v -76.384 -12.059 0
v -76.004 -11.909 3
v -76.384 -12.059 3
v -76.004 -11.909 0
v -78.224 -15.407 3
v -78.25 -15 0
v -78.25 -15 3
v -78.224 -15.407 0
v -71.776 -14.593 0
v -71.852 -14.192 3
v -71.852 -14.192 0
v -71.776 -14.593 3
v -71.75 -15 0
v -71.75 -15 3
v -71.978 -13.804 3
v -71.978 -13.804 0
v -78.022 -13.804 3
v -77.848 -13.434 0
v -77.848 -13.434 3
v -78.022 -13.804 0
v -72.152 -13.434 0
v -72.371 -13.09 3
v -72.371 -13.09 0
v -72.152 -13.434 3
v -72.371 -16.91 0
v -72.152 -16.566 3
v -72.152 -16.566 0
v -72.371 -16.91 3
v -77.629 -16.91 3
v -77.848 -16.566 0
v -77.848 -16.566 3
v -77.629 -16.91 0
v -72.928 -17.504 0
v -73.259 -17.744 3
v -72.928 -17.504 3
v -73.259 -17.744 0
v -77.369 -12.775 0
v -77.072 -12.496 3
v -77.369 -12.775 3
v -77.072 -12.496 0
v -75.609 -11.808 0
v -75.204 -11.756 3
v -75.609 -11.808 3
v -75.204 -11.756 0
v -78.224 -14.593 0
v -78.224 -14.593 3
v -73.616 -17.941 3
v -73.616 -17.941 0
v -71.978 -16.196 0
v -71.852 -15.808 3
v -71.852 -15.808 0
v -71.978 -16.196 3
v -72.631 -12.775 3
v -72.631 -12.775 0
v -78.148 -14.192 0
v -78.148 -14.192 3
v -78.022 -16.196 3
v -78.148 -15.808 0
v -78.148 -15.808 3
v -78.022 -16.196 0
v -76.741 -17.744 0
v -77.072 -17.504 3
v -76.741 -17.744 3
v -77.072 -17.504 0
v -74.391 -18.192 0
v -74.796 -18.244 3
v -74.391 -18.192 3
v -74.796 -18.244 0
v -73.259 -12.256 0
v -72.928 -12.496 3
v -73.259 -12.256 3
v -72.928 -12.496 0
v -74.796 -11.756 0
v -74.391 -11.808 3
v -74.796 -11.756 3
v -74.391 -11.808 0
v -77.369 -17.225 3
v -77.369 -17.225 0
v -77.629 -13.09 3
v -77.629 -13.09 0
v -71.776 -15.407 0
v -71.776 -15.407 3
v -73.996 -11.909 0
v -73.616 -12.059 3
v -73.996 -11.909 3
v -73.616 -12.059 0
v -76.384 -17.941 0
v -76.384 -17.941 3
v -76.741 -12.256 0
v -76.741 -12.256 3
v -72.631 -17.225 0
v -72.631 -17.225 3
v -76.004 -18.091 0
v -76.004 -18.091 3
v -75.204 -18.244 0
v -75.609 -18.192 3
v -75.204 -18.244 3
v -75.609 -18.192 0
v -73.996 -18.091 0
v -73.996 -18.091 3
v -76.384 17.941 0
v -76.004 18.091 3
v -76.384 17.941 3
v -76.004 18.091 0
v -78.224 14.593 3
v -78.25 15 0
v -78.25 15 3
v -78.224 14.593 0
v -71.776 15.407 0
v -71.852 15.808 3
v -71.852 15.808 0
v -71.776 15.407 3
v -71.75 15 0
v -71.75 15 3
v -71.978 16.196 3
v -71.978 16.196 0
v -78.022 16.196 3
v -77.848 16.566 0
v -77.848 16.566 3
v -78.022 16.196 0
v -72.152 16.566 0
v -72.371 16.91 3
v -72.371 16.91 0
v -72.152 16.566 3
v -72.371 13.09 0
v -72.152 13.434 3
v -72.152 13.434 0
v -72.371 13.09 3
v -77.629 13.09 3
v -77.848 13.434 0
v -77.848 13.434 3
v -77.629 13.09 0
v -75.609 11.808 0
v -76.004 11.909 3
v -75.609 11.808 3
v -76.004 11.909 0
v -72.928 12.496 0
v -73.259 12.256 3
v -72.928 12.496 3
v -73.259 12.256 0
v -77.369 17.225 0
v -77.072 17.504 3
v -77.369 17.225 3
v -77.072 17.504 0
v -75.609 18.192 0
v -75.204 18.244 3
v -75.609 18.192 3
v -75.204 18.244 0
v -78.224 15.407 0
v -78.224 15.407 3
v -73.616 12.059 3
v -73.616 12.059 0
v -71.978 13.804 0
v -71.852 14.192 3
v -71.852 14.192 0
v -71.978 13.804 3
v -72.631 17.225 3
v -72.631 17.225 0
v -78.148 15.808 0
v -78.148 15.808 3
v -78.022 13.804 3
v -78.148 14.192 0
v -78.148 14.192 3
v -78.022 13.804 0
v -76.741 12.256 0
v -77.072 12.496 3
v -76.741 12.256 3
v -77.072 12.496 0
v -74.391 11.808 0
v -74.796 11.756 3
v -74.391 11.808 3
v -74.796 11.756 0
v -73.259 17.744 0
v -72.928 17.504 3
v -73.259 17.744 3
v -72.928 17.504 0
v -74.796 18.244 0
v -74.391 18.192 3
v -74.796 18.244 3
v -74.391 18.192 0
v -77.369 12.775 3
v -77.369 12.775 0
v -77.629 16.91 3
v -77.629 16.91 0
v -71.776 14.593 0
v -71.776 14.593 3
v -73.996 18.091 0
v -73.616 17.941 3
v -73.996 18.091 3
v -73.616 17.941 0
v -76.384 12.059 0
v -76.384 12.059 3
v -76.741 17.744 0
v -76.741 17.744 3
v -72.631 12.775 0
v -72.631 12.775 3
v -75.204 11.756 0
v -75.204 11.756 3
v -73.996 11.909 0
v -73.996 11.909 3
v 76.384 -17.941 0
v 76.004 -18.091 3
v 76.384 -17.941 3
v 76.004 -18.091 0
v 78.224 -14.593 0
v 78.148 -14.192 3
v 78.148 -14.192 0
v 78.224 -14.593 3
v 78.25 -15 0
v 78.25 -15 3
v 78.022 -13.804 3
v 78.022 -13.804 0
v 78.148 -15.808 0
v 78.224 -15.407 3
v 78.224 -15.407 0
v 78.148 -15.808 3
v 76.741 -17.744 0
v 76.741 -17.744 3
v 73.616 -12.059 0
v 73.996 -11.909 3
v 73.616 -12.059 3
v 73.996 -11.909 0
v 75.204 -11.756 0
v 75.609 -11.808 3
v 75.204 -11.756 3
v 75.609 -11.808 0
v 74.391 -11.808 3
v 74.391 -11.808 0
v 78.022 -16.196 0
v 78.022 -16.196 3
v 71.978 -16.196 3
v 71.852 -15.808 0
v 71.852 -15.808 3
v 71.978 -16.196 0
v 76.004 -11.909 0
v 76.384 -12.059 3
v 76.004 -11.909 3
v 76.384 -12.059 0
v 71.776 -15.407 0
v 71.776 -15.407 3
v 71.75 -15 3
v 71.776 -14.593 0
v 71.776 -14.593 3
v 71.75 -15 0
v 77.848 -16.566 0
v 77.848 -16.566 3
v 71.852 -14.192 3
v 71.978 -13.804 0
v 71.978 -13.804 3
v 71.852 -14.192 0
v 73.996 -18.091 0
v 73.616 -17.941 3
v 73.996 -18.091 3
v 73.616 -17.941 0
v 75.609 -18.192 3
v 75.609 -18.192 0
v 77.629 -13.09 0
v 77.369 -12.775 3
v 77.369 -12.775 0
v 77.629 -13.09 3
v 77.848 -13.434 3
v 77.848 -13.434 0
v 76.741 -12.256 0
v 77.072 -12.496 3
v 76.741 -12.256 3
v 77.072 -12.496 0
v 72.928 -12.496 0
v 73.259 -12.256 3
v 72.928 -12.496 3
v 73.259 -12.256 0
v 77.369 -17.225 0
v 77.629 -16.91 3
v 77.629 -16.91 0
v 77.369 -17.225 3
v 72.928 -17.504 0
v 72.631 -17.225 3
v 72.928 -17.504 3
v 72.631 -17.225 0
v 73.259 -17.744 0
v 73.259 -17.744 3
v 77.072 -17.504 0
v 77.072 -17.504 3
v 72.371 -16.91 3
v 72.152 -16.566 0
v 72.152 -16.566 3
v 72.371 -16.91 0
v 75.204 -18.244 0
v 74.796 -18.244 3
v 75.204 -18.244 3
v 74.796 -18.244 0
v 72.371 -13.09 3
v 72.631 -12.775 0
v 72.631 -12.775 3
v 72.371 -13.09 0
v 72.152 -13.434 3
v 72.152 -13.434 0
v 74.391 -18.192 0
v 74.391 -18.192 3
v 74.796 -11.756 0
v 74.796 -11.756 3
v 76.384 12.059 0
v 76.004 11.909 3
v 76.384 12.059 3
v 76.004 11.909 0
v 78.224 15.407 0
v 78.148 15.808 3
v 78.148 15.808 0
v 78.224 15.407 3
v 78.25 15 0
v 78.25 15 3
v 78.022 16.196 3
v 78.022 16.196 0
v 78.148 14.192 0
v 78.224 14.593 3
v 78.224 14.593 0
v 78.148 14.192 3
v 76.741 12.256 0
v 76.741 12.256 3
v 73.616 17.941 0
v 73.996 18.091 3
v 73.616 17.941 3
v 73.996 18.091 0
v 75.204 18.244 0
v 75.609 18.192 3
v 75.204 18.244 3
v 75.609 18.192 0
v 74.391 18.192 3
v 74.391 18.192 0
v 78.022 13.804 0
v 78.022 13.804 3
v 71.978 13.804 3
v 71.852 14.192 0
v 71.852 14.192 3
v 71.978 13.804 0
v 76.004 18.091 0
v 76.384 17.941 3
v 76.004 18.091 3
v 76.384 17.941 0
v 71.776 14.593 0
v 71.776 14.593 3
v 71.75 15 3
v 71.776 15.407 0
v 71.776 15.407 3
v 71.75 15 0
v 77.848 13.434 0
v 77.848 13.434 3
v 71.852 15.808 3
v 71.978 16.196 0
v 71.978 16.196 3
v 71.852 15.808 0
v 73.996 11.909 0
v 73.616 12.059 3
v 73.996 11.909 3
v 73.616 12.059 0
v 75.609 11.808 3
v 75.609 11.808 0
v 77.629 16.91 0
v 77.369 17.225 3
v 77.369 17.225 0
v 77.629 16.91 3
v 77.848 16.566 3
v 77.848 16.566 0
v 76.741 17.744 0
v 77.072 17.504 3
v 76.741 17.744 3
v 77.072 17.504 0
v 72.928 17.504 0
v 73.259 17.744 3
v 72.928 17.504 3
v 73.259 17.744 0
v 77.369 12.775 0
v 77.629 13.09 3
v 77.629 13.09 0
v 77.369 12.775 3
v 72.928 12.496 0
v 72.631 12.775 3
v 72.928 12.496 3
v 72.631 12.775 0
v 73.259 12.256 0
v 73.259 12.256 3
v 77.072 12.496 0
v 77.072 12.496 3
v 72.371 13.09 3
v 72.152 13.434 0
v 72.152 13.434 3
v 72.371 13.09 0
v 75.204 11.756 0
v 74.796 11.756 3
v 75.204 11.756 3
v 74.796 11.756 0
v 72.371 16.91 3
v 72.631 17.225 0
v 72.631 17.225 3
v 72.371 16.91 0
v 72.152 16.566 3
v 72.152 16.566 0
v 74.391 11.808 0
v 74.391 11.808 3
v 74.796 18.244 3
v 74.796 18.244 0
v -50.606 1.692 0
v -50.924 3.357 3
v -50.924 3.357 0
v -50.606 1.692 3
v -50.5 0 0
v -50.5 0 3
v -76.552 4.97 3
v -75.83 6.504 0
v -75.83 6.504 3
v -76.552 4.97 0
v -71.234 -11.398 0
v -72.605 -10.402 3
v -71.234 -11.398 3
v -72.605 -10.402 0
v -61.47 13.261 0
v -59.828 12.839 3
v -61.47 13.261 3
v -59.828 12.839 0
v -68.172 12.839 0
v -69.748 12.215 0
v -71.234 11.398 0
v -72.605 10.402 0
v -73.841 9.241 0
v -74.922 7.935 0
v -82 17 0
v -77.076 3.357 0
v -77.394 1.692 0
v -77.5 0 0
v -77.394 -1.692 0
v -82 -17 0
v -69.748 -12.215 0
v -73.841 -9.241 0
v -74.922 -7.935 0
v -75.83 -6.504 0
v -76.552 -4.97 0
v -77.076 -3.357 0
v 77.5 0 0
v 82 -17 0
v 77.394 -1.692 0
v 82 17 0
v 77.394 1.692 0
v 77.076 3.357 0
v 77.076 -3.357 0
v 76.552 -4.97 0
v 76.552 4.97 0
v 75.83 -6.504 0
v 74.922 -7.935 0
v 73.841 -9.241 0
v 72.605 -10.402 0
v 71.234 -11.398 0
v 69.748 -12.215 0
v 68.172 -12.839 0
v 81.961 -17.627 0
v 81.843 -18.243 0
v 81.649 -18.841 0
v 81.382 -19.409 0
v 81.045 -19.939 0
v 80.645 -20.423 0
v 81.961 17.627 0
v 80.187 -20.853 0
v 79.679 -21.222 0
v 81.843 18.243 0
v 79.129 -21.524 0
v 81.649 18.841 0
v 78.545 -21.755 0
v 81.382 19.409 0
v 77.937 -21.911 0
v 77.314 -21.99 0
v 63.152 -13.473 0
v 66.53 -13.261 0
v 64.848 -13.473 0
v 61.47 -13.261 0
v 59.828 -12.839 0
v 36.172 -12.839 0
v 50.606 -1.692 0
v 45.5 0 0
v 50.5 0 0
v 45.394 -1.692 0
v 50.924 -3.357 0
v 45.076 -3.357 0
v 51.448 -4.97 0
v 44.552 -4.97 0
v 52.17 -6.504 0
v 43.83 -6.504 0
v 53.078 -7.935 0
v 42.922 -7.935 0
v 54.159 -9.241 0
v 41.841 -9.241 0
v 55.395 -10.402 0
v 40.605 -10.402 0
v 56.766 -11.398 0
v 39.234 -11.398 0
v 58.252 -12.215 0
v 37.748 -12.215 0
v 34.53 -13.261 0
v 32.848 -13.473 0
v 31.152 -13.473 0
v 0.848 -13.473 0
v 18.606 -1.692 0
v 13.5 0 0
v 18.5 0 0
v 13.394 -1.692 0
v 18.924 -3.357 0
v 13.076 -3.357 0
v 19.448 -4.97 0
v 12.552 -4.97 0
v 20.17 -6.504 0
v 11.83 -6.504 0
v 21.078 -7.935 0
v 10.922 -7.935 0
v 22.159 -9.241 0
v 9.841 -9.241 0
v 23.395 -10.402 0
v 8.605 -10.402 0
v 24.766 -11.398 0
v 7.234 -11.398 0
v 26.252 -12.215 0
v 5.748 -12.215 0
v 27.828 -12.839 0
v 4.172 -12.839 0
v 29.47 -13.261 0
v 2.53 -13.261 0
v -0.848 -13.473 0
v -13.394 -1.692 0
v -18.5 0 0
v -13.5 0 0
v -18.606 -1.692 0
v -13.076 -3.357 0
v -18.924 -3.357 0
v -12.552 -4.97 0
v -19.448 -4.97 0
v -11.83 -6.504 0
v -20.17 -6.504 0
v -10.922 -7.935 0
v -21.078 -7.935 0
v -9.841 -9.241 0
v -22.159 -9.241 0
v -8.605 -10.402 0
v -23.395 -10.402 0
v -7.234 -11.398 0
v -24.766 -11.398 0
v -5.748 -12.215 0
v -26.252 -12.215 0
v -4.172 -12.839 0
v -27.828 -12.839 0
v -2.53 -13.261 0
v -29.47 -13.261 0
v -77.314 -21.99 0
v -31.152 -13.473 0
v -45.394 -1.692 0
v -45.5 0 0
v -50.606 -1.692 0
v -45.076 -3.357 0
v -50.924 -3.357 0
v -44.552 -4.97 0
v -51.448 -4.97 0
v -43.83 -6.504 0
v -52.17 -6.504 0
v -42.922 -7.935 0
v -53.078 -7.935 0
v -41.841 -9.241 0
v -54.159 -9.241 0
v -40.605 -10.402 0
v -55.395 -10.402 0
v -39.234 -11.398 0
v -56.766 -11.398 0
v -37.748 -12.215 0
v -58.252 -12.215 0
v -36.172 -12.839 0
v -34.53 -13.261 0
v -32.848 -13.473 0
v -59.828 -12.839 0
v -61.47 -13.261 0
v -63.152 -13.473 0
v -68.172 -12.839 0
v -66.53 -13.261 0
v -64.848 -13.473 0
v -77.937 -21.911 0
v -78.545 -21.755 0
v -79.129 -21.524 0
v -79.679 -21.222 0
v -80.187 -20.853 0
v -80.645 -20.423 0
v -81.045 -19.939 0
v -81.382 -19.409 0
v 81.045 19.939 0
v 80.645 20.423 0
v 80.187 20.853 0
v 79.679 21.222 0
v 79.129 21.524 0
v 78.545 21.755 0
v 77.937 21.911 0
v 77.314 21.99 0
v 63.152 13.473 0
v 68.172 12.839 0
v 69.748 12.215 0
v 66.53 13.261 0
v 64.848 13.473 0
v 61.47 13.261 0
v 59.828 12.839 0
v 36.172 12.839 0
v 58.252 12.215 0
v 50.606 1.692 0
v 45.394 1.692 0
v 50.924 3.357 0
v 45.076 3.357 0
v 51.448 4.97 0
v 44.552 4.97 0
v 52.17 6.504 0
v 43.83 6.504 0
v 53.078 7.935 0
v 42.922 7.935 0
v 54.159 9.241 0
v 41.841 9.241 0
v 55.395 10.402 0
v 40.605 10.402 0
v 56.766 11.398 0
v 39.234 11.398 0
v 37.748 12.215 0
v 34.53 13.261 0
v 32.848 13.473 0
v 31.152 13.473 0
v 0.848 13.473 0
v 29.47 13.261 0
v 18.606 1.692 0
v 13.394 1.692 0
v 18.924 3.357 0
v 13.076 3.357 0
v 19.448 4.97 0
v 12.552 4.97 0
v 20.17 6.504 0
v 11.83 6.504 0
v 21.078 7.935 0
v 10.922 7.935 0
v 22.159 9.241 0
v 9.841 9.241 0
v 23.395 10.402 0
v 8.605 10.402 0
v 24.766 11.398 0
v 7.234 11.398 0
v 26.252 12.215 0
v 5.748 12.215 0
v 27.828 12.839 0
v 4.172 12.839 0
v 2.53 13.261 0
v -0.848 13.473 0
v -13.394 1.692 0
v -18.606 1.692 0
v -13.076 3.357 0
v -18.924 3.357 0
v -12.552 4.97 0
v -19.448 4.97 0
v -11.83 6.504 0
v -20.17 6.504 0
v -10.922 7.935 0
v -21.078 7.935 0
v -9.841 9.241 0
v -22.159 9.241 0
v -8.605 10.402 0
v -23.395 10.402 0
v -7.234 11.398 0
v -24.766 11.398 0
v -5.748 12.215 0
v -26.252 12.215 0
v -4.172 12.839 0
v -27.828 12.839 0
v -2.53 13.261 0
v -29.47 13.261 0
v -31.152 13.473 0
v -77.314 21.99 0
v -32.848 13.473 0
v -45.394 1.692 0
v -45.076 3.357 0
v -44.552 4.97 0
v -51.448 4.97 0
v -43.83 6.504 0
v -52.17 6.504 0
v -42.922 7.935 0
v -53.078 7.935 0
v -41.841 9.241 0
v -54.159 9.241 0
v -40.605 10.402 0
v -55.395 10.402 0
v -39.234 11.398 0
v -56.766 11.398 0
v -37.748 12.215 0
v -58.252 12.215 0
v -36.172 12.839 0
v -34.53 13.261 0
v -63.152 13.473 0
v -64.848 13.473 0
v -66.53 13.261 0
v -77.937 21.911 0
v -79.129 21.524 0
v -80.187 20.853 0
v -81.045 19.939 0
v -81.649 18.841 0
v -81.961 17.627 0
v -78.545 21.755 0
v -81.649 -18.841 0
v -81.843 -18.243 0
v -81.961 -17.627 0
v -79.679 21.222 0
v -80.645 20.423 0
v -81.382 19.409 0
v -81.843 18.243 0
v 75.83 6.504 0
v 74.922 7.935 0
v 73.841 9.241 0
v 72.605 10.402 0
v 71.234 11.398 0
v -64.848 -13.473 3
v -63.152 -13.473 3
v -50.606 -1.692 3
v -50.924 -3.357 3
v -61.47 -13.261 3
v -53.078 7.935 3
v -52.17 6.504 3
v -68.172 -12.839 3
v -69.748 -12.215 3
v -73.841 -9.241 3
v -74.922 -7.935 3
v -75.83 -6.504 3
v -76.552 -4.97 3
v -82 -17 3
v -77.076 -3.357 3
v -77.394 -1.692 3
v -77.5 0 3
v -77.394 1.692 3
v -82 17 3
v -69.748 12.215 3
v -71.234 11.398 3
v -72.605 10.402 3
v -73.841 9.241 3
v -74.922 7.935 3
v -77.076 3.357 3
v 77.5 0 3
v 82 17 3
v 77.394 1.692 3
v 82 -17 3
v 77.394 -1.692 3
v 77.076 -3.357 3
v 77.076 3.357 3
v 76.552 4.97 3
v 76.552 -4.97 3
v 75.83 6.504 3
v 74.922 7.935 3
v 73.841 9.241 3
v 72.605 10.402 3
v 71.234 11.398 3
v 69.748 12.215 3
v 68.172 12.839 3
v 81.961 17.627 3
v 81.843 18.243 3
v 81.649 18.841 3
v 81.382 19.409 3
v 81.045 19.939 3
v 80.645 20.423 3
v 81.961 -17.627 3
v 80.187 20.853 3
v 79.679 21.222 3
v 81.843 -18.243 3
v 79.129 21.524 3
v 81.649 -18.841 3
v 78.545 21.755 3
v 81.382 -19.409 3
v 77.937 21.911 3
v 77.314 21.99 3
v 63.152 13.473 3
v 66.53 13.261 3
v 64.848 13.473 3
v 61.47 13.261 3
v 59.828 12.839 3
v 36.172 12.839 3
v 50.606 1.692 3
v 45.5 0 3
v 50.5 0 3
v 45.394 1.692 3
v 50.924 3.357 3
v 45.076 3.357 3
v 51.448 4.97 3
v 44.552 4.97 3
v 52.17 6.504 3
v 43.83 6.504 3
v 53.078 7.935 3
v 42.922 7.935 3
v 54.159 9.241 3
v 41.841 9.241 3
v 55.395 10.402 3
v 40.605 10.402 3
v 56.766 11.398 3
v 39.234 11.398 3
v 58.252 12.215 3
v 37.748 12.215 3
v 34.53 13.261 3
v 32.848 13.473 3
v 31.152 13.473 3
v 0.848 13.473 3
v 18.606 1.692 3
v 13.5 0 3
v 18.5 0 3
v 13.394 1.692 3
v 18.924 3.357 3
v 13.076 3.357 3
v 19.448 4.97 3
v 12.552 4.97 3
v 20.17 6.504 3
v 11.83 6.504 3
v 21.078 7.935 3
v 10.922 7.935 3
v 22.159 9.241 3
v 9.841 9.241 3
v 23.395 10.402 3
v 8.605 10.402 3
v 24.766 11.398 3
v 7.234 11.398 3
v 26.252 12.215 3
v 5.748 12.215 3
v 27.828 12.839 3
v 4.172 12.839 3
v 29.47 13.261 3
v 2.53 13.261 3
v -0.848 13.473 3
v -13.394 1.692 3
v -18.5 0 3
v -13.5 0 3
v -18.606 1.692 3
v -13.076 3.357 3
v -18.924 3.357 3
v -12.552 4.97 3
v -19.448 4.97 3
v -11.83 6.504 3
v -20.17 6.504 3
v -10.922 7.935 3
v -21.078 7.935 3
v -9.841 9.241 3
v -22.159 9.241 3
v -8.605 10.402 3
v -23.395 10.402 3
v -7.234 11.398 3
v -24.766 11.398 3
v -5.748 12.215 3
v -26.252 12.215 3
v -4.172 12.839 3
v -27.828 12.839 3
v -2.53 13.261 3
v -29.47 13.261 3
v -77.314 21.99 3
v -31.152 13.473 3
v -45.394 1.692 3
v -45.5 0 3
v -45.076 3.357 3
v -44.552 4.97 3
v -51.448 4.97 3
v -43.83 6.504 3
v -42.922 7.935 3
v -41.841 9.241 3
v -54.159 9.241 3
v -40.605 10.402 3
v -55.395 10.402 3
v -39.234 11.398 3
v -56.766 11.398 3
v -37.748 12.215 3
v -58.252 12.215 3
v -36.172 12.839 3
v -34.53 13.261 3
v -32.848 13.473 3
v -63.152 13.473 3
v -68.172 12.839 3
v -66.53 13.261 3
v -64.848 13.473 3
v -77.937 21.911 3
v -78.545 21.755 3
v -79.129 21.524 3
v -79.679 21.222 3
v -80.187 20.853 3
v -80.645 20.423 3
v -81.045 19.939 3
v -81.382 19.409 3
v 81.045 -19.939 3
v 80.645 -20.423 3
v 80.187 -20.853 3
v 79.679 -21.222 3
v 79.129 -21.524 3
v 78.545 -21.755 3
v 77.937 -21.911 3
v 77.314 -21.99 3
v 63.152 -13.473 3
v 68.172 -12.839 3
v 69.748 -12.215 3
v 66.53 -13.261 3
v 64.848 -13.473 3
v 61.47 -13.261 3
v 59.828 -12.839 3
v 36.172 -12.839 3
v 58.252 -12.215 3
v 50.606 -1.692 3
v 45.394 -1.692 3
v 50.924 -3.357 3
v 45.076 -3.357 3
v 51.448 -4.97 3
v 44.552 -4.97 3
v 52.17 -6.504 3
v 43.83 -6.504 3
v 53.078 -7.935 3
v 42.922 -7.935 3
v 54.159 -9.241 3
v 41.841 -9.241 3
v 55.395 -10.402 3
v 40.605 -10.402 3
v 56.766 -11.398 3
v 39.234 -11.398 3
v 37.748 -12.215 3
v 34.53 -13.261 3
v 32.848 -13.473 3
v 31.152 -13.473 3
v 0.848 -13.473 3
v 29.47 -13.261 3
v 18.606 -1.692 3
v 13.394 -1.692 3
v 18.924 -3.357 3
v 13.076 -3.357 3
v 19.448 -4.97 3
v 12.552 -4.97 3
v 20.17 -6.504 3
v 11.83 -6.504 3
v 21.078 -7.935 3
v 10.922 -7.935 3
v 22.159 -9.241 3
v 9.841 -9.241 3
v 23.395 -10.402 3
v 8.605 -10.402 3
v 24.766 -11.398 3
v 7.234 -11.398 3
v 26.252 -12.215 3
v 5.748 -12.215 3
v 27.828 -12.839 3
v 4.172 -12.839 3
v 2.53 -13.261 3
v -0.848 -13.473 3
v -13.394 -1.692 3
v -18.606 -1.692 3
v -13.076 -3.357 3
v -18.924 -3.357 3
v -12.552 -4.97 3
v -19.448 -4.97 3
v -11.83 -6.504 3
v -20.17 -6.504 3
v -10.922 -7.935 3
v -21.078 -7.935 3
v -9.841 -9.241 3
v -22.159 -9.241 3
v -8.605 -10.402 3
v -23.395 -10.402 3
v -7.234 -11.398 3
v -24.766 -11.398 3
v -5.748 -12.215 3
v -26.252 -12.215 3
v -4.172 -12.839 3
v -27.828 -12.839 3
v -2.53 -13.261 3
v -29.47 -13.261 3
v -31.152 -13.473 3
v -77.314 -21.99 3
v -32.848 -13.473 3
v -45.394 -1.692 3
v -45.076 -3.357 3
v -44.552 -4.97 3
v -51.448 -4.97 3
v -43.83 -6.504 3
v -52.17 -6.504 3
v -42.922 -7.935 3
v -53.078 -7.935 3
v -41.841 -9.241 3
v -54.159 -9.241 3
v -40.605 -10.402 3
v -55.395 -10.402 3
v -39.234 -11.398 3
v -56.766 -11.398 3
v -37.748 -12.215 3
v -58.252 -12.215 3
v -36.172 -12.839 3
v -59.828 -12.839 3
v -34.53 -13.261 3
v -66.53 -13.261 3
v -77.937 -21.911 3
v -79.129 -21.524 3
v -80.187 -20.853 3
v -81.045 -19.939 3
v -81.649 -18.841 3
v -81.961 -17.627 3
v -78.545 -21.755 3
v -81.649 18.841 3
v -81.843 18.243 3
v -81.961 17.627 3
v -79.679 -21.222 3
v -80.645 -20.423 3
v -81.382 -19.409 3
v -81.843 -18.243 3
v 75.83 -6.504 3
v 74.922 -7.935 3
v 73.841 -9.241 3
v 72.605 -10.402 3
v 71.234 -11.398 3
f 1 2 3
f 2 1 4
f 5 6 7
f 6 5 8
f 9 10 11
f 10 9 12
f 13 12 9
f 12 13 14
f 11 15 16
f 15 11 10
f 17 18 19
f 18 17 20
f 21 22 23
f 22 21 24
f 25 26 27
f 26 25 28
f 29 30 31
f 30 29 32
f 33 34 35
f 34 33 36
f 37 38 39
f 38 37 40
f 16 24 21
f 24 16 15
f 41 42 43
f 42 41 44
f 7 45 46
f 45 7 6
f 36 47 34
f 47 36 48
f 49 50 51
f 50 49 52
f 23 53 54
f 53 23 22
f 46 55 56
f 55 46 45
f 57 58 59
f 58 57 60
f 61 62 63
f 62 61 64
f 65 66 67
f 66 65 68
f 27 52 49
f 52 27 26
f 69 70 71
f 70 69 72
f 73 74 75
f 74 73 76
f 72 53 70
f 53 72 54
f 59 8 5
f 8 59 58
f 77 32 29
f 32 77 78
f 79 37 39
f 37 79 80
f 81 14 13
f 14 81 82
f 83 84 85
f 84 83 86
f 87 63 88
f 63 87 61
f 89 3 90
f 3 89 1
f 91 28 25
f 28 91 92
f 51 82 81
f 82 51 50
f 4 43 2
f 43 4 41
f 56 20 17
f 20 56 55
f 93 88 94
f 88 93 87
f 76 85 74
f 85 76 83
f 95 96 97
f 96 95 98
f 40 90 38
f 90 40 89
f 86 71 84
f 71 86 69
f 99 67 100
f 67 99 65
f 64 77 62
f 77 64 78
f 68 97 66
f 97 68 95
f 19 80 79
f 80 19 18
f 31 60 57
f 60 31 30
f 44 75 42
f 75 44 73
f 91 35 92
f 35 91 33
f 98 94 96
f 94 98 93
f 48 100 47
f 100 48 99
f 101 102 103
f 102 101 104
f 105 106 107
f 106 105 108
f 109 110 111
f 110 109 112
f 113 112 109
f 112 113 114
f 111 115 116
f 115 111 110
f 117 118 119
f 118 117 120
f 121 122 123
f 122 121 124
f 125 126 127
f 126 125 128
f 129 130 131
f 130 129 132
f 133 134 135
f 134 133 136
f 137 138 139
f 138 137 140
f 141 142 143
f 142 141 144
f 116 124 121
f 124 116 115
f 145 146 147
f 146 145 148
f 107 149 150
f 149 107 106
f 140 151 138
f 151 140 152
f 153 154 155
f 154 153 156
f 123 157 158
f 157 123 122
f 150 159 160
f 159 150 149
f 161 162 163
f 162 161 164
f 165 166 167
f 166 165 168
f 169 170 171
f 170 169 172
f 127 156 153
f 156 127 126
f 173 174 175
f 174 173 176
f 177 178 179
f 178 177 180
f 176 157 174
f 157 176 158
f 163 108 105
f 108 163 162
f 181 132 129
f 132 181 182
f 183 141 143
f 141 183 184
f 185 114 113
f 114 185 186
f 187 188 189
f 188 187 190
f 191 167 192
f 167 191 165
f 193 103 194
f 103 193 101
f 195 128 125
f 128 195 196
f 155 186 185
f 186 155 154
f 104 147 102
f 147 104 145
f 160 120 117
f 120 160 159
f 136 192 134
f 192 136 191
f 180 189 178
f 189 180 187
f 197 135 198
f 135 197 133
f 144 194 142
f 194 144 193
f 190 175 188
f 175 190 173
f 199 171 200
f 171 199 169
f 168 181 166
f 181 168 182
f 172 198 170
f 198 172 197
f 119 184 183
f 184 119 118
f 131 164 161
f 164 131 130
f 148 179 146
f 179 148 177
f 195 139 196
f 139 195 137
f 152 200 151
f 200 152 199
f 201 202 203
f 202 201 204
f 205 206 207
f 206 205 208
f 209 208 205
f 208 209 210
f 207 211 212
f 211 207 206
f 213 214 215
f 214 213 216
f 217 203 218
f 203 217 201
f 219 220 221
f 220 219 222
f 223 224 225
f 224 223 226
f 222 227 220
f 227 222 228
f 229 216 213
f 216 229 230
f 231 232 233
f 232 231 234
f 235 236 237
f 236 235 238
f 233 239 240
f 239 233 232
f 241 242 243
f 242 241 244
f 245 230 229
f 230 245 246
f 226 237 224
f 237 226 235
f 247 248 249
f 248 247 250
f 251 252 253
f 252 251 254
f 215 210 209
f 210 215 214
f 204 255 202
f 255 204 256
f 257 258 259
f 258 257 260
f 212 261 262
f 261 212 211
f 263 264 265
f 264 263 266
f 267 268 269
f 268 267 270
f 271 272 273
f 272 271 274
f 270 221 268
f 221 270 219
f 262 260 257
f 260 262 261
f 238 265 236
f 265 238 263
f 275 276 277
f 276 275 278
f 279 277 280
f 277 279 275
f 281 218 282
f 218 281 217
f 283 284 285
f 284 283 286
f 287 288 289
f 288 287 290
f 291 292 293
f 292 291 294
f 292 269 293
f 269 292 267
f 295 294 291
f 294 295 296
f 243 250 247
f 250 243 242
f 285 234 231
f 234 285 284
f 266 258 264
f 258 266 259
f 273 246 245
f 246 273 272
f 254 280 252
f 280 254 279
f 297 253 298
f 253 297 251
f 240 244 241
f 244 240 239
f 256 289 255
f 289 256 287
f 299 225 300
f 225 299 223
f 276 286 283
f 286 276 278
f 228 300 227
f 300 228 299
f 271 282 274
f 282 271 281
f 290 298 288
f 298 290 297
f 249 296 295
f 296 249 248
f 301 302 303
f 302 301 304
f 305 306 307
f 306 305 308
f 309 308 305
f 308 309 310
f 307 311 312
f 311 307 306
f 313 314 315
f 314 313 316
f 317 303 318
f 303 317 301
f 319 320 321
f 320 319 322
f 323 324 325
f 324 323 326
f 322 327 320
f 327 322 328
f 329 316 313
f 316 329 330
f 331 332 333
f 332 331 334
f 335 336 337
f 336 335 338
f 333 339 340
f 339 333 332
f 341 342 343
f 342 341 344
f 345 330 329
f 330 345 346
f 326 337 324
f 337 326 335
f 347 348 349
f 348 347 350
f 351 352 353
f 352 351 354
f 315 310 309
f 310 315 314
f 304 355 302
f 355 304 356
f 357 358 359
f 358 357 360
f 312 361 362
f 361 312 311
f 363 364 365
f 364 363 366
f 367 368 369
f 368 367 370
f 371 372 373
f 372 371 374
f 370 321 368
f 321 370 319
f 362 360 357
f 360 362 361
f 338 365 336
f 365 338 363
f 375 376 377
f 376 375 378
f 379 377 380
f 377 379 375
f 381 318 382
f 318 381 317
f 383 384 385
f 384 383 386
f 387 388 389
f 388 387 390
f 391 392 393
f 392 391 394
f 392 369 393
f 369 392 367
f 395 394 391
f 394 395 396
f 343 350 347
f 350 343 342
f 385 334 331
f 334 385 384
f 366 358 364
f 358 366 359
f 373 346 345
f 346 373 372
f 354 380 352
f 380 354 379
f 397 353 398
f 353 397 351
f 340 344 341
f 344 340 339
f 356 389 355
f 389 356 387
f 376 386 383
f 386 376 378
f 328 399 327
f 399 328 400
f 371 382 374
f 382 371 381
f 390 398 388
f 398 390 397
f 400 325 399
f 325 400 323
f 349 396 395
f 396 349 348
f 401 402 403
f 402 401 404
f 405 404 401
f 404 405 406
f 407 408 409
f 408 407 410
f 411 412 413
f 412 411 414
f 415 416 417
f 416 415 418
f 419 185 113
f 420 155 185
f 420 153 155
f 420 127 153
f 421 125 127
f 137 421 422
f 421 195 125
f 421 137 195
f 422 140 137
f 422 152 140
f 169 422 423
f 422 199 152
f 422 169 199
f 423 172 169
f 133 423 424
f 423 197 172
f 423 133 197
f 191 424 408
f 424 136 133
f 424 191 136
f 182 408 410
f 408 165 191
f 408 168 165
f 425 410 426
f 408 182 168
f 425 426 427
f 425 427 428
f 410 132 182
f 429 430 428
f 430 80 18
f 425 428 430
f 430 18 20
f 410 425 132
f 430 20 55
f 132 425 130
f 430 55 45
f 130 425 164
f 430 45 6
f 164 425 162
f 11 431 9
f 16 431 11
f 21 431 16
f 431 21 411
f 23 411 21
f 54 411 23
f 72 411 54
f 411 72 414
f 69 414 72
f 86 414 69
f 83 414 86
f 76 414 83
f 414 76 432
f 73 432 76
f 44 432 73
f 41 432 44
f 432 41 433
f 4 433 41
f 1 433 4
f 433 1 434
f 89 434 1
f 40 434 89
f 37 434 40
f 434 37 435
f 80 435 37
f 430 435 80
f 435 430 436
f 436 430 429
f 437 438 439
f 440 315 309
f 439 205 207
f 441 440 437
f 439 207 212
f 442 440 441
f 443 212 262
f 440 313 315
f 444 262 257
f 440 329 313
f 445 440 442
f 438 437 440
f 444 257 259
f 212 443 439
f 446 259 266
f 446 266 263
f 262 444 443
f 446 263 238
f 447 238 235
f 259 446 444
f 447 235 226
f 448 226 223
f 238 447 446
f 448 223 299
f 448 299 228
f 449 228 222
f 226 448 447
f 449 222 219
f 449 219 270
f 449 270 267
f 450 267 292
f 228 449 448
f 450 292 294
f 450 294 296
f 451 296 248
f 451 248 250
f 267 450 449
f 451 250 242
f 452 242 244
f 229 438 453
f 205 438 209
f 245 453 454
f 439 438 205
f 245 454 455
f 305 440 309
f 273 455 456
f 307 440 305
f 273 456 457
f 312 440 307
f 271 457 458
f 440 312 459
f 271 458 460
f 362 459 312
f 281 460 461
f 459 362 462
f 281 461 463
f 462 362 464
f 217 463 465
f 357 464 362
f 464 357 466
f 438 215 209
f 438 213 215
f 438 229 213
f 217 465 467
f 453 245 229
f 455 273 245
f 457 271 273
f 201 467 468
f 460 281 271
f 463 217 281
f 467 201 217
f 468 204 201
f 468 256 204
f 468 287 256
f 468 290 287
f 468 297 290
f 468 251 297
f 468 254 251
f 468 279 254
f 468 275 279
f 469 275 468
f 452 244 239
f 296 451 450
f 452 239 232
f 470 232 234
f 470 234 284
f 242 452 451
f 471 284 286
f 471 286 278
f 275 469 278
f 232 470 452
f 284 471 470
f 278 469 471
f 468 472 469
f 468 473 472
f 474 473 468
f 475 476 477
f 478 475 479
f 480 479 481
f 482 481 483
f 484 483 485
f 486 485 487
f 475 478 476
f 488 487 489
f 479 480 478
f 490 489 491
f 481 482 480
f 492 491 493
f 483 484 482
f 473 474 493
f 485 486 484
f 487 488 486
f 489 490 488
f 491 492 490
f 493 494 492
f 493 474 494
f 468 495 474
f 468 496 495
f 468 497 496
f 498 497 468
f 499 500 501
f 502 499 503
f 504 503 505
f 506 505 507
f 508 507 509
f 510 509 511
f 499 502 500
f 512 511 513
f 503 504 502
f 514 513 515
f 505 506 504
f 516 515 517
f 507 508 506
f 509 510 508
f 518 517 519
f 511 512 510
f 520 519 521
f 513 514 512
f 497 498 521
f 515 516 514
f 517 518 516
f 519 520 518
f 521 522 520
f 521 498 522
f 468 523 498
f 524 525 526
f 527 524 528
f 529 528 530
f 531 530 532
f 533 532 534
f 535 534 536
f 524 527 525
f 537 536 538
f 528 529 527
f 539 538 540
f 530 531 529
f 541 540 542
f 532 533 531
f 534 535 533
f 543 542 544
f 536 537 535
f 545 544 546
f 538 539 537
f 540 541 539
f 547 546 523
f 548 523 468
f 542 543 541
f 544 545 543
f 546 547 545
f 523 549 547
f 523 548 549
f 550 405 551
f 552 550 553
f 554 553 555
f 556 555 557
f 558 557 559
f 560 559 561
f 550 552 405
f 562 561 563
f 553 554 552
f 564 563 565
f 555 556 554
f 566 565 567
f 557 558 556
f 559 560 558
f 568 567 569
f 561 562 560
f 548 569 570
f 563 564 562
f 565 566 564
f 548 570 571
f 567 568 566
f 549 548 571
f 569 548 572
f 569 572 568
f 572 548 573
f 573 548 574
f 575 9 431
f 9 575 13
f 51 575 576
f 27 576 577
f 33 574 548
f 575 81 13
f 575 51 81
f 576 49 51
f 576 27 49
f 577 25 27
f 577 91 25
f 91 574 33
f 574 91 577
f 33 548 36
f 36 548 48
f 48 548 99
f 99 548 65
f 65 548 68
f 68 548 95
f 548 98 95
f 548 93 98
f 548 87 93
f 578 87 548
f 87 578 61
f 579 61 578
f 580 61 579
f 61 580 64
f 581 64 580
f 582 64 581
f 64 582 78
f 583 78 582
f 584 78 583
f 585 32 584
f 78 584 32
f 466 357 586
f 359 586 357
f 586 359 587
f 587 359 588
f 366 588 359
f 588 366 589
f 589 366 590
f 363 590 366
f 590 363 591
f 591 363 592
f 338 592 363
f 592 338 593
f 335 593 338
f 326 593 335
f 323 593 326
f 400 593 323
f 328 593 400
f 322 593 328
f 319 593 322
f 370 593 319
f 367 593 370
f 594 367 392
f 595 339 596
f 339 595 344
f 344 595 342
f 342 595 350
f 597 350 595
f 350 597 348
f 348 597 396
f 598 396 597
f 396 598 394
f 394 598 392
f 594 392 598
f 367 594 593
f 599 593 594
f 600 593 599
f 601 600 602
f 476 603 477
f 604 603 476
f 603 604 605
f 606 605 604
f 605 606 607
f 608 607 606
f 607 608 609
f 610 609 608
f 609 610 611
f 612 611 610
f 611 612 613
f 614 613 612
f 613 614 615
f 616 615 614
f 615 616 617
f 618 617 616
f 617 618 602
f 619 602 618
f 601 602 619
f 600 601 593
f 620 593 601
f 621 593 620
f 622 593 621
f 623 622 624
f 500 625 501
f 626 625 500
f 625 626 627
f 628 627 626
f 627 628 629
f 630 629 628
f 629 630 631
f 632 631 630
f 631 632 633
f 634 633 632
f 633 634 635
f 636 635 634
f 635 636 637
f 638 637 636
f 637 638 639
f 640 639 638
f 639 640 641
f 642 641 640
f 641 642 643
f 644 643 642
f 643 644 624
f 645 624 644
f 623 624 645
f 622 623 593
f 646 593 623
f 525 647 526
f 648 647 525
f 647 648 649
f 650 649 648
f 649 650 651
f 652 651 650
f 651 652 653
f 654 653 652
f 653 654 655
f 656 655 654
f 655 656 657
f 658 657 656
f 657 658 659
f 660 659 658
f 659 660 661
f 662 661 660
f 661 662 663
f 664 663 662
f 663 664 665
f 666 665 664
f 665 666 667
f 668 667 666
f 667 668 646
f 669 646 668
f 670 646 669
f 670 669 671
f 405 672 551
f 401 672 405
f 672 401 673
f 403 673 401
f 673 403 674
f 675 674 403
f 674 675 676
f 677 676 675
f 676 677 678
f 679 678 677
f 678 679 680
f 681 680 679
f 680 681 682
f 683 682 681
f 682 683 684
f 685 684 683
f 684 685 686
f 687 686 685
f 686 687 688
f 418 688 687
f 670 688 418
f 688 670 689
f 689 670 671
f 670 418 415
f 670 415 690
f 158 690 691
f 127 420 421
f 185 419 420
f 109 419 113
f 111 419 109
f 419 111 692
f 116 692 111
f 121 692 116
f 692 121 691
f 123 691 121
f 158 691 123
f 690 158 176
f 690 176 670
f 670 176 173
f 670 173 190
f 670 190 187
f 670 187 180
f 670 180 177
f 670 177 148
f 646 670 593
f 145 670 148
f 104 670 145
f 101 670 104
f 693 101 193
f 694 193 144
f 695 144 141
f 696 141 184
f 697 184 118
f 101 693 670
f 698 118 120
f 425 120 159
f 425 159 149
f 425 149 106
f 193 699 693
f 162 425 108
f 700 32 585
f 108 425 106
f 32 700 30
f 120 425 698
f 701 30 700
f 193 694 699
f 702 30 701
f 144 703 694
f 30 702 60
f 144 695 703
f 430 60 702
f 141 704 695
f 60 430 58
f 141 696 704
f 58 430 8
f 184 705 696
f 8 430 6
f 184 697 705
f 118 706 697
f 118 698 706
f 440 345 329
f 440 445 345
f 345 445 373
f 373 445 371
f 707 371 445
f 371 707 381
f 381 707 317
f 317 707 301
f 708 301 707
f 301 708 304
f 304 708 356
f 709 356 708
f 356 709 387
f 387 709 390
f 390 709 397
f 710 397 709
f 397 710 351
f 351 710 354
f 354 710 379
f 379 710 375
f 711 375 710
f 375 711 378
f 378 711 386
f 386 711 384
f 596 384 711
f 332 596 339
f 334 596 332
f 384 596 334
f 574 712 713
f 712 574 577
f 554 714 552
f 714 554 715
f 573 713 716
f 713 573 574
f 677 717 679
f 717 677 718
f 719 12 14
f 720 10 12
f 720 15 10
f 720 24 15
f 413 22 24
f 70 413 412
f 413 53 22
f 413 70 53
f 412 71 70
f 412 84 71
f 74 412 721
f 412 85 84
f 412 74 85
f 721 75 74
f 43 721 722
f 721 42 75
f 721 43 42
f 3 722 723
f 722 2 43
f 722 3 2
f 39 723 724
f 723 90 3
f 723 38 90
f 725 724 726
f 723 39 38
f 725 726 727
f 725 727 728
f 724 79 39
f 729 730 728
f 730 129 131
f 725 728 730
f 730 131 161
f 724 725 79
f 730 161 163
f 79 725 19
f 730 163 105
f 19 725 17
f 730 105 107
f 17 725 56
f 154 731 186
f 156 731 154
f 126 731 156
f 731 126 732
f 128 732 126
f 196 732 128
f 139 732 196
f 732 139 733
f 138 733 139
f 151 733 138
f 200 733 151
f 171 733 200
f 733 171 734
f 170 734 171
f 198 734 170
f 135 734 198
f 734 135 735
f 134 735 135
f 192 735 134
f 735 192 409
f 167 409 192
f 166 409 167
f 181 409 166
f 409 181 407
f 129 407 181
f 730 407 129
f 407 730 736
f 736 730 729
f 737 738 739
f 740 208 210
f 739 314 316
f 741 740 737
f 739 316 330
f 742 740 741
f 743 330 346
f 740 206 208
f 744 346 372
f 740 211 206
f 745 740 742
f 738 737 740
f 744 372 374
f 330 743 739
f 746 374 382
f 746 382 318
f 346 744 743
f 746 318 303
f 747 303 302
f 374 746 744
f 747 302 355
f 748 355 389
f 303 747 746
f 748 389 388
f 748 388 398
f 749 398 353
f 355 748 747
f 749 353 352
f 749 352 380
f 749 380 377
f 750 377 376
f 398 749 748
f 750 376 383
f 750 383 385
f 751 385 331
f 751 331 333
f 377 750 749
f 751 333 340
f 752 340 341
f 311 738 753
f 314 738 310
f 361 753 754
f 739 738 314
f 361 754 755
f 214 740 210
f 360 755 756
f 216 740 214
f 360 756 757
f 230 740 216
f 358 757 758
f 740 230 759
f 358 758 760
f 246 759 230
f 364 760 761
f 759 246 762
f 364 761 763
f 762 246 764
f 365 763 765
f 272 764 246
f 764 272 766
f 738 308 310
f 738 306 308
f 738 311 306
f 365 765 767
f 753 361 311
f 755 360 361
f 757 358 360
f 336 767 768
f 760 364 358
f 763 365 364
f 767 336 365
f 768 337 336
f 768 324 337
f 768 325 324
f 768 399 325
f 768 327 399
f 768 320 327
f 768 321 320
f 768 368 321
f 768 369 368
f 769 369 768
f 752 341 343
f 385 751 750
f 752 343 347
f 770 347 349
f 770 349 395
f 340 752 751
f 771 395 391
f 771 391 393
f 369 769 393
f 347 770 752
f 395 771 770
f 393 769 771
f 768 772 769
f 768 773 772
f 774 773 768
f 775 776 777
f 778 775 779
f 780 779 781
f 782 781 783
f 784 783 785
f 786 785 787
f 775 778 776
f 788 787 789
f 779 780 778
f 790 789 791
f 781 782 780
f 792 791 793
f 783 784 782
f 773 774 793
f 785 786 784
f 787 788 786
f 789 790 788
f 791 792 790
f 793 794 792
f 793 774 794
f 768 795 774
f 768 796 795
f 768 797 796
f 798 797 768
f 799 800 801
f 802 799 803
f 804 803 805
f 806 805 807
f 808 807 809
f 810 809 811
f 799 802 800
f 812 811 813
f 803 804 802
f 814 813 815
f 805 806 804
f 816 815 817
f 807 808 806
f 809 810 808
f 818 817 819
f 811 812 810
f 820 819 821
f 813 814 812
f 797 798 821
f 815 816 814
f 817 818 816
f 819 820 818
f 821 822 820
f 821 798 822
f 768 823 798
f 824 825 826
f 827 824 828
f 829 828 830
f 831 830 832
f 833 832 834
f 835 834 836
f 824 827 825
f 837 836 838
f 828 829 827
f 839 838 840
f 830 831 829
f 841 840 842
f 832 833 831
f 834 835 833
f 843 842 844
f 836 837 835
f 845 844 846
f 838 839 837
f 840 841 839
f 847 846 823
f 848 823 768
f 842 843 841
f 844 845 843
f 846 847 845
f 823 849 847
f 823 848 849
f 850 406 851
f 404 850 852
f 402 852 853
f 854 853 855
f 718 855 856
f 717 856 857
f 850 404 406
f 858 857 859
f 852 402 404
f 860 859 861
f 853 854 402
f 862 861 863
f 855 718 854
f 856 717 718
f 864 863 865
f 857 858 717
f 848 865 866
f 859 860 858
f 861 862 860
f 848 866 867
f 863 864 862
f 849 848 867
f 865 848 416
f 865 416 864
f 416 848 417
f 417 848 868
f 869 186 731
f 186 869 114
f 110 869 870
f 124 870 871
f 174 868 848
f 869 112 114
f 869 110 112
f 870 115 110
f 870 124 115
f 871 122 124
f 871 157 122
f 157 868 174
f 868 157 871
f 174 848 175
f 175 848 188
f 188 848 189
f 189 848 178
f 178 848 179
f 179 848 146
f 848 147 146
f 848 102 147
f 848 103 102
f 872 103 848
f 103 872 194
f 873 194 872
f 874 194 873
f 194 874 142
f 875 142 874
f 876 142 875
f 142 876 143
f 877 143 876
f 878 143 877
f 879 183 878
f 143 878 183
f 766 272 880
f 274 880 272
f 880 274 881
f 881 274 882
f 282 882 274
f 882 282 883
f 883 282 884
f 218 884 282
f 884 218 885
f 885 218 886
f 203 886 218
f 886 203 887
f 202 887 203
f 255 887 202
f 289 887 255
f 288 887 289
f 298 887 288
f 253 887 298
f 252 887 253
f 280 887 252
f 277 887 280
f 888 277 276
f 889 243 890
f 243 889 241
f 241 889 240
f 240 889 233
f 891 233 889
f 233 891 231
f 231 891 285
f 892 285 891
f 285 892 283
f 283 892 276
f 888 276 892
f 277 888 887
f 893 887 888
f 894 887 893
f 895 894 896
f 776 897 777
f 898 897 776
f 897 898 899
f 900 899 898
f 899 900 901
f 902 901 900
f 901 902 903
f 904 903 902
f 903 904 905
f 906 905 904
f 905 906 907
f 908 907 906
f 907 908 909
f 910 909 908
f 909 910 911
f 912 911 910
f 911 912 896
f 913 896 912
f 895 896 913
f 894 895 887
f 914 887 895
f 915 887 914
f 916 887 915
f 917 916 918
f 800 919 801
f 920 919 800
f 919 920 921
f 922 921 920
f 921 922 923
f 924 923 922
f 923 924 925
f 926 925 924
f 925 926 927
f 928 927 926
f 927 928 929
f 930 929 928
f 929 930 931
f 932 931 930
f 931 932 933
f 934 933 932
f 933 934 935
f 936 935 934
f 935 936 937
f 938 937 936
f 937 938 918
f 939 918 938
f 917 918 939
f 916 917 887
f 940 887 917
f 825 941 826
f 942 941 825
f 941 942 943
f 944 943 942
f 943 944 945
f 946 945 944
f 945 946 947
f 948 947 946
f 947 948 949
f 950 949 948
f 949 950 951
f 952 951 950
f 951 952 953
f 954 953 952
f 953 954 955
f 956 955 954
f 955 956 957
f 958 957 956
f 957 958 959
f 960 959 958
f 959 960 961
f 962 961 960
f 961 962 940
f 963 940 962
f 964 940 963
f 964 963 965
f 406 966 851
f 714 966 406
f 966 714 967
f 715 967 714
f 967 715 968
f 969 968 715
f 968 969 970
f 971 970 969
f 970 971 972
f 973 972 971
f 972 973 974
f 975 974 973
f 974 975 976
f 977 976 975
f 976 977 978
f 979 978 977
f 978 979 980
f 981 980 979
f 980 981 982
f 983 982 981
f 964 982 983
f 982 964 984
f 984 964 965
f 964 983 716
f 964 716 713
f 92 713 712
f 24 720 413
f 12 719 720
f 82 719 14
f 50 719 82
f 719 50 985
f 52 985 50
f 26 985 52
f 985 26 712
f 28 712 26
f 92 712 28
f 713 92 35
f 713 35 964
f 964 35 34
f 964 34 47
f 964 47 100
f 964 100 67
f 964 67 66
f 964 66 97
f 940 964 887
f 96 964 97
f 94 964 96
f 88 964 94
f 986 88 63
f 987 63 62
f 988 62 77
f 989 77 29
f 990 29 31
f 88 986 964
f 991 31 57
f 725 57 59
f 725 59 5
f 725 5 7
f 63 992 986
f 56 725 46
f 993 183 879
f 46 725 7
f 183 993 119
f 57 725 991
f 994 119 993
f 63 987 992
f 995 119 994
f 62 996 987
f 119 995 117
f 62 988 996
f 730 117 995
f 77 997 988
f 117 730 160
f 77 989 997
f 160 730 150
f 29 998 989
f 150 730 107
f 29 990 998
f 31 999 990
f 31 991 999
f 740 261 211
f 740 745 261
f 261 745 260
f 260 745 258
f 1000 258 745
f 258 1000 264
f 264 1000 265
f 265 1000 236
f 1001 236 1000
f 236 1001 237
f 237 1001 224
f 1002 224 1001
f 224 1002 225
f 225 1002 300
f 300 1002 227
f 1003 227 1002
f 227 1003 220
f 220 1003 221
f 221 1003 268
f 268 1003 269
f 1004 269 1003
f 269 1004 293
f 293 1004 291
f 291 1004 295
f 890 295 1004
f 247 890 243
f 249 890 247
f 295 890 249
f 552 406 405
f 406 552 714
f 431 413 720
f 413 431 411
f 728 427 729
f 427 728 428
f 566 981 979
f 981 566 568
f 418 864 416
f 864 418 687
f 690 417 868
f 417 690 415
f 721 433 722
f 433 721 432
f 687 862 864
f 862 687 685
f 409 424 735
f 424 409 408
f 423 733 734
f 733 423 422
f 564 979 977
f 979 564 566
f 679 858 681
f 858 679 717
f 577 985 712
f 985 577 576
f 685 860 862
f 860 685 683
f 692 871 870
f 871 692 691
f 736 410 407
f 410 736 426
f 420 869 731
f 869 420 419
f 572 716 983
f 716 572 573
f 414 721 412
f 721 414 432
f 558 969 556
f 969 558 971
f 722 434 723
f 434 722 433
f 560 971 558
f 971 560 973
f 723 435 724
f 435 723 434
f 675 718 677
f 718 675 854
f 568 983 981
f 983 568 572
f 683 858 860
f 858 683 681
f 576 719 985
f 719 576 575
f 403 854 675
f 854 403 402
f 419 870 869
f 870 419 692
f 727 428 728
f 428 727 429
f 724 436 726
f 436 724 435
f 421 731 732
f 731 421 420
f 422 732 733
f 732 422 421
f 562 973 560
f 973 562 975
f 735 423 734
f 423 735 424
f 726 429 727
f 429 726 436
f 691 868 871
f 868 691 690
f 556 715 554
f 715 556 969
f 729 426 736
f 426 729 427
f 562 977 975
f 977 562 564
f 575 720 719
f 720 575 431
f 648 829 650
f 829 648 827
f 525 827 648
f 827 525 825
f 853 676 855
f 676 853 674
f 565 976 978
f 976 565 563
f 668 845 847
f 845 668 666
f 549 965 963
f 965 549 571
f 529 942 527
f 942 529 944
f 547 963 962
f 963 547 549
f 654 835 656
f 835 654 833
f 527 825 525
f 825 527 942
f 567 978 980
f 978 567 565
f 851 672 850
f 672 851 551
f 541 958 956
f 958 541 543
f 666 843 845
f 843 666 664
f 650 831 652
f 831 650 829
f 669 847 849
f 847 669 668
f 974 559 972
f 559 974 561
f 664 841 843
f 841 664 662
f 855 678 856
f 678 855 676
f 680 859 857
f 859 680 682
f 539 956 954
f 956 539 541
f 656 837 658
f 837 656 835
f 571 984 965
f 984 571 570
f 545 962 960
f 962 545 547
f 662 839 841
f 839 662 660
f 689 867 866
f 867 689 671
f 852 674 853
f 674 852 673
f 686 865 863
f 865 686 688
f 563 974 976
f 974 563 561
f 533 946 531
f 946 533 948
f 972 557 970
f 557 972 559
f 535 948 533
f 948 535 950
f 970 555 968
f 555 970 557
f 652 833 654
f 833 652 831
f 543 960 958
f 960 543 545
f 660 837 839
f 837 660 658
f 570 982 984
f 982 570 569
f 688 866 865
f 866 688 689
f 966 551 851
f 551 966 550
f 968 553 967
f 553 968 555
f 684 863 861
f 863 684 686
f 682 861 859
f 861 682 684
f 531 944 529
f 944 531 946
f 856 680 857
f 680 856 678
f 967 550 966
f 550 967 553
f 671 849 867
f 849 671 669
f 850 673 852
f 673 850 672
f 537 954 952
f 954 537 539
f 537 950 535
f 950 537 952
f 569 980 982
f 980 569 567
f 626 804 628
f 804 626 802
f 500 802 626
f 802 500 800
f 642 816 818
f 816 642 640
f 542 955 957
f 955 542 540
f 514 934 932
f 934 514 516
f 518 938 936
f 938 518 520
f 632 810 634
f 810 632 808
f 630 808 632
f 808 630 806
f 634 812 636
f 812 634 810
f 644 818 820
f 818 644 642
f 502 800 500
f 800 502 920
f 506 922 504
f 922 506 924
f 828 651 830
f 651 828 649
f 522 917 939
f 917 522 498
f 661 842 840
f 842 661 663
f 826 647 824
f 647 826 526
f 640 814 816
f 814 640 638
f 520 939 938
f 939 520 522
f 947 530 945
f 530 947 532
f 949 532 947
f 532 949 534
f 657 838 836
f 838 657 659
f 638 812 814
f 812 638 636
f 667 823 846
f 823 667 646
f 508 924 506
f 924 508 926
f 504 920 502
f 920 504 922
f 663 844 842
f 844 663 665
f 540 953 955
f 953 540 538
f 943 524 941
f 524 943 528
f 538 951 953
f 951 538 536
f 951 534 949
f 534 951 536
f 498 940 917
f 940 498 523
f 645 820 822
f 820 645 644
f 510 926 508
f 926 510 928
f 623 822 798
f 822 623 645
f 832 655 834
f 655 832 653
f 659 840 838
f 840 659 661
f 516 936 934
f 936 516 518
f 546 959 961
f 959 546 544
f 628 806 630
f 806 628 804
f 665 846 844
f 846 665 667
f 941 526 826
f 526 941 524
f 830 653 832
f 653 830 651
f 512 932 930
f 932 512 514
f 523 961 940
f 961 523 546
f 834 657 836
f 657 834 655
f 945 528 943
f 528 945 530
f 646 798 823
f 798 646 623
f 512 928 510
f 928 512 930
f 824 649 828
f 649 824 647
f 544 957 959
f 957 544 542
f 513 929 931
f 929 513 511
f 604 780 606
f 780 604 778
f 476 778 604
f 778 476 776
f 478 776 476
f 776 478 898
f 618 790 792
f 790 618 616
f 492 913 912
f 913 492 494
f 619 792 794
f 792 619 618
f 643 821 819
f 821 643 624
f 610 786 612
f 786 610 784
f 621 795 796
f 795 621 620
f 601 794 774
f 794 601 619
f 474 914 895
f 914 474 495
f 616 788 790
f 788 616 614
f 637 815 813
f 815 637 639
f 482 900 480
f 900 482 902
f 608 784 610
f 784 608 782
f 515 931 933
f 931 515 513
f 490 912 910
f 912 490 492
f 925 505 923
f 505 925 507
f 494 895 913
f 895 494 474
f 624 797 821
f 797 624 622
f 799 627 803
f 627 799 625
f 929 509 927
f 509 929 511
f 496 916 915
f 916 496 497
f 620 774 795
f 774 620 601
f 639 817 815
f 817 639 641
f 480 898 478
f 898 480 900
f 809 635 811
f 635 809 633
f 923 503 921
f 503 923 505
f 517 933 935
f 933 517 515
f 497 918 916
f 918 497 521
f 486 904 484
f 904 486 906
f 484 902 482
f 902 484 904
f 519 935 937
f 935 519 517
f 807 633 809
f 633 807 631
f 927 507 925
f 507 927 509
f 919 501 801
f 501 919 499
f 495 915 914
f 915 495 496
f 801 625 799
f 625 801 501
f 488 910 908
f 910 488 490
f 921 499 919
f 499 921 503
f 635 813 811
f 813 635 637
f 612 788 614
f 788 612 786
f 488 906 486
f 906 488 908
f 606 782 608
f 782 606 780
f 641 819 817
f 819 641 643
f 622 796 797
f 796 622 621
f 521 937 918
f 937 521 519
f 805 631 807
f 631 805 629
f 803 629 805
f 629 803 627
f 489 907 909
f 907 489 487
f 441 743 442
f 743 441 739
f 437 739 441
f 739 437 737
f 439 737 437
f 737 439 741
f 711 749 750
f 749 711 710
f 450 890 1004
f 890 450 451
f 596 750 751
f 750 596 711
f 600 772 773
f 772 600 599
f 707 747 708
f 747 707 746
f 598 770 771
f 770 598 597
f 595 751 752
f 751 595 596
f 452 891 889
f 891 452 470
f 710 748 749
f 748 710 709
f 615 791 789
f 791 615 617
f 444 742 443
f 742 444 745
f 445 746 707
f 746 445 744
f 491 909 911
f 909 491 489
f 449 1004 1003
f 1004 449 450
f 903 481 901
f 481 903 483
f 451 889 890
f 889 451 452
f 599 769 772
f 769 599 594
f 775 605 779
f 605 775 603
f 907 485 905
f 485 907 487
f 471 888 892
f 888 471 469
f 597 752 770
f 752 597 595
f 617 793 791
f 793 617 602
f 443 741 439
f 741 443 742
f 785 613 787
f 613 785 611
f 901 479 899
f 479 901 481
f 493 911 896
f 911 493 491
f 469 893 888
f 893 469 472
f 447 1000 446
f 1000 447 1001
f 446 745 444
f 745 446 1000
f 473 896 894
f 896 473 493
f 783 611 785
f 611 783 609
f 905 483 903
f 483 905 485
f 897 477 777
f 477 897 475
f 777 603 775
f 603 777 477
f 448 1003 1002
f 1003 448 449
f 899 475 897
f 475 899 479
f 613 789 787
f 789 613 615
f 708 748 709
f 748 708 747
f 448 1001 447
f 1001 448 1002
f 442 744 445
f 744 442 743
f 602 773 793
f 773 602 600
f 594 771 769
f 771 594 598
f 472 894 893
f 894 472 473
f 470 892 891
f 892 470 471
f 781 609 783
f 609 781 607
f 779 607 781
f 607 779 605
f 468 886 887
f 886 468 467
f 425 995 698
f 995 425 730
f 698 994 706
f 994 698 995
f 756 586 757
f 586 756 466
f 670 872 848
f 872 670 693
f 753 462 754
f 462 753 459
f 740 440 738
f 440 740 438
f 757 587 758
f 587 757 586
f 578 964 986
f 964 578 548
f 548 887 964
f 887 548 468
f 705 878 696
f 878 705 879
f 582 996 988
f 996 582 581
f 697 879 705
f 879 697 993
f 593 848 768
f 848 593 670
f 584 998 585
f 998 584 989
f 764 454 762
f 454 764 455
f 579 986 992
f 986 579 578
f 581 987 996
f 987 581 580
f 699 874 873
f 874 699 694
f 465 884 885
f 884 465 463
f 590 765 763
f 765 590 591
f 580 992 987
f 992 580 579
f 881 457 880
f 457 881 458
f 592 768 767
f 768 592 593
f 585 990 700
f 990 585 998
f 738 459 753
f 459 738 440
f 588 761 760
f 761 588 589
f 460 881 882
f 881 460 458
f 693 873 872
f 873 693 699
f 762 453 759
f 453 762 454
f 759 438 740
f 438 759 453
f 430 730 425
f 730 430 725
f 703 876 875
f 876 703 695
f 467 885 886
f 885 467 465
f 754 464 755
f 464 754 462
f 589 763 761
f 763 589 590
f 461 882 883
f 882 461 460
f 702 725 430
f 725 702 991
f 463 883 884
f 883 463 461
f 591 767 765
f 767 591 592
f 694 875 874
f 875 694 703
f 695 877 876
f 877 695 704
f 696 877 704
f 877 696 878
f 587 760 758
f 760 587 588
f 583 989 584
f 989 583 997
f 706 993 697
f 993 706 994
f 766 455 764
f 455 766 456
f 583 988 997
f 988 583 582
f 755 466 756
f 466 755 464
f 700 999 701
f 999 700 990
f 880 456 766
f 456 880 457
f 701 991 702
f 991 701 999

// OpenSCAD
$fn = 50;


difference() {
	union() {
		hull() {
			translate(v = [-77.0000000000, 17.0000000000, 0]) {
				cylinder(h = 3, r = 5);
			}
			translate(v = [77.0000000000, 17.0000000000, 0]) {
				cylinder(h = 3, r = 5);
			}
			translate(v = [-77.0000000000, -17.0000000000, 0]) {
				cylinder(h = 3, r = 5);
			}
			translate(v = [77.0000000000, -17.0000000000, 0]) {
				cylinder(h = 3, r = 5);
			}
		}
	}
	union() {
		#translate(v = [-75.0000000000, -15.0000000000, -100.0000000000]) {
			cylinder(h = 200, r = 3.2500000000);
		}
		#translate(v = [-75.0000000000, 15.0000000000, -100.0000000000]) {
			cylinder(h = 200, r = 3.2500000000);
		}
		#translate(v = [75.0000000000, -15.0000000000, -100.0000000000]) {
			cylinder(h = 200, r = 3.2500000000);
		}
		#translate(v = [75.0000000000, 15.0000000000, -100.0000000000]) {
			cylinder(h = 200, r = 3.2500000000);
		}
		#translate(v = [-64.0000000000, 0, 0]) {
			cylinder(h = 3, r = 13.5000000000);
		}
		#translate(v = [-32.0000000000, 0, 0]) {
			cylinder(h = 3, r = 13.5000000000);
		}
		#cylinder(h = 3, r = 13.5000000000);
		#translate(v = [32.0000000000, 0, 0]) {
			cylinder(h = 3, r = 13.5000000000);
		}
		#translate(v = [64.0000000000, 0, 0]) {
			cylinder(h = 3, r = 13.5000000000);
		}
	}
}
